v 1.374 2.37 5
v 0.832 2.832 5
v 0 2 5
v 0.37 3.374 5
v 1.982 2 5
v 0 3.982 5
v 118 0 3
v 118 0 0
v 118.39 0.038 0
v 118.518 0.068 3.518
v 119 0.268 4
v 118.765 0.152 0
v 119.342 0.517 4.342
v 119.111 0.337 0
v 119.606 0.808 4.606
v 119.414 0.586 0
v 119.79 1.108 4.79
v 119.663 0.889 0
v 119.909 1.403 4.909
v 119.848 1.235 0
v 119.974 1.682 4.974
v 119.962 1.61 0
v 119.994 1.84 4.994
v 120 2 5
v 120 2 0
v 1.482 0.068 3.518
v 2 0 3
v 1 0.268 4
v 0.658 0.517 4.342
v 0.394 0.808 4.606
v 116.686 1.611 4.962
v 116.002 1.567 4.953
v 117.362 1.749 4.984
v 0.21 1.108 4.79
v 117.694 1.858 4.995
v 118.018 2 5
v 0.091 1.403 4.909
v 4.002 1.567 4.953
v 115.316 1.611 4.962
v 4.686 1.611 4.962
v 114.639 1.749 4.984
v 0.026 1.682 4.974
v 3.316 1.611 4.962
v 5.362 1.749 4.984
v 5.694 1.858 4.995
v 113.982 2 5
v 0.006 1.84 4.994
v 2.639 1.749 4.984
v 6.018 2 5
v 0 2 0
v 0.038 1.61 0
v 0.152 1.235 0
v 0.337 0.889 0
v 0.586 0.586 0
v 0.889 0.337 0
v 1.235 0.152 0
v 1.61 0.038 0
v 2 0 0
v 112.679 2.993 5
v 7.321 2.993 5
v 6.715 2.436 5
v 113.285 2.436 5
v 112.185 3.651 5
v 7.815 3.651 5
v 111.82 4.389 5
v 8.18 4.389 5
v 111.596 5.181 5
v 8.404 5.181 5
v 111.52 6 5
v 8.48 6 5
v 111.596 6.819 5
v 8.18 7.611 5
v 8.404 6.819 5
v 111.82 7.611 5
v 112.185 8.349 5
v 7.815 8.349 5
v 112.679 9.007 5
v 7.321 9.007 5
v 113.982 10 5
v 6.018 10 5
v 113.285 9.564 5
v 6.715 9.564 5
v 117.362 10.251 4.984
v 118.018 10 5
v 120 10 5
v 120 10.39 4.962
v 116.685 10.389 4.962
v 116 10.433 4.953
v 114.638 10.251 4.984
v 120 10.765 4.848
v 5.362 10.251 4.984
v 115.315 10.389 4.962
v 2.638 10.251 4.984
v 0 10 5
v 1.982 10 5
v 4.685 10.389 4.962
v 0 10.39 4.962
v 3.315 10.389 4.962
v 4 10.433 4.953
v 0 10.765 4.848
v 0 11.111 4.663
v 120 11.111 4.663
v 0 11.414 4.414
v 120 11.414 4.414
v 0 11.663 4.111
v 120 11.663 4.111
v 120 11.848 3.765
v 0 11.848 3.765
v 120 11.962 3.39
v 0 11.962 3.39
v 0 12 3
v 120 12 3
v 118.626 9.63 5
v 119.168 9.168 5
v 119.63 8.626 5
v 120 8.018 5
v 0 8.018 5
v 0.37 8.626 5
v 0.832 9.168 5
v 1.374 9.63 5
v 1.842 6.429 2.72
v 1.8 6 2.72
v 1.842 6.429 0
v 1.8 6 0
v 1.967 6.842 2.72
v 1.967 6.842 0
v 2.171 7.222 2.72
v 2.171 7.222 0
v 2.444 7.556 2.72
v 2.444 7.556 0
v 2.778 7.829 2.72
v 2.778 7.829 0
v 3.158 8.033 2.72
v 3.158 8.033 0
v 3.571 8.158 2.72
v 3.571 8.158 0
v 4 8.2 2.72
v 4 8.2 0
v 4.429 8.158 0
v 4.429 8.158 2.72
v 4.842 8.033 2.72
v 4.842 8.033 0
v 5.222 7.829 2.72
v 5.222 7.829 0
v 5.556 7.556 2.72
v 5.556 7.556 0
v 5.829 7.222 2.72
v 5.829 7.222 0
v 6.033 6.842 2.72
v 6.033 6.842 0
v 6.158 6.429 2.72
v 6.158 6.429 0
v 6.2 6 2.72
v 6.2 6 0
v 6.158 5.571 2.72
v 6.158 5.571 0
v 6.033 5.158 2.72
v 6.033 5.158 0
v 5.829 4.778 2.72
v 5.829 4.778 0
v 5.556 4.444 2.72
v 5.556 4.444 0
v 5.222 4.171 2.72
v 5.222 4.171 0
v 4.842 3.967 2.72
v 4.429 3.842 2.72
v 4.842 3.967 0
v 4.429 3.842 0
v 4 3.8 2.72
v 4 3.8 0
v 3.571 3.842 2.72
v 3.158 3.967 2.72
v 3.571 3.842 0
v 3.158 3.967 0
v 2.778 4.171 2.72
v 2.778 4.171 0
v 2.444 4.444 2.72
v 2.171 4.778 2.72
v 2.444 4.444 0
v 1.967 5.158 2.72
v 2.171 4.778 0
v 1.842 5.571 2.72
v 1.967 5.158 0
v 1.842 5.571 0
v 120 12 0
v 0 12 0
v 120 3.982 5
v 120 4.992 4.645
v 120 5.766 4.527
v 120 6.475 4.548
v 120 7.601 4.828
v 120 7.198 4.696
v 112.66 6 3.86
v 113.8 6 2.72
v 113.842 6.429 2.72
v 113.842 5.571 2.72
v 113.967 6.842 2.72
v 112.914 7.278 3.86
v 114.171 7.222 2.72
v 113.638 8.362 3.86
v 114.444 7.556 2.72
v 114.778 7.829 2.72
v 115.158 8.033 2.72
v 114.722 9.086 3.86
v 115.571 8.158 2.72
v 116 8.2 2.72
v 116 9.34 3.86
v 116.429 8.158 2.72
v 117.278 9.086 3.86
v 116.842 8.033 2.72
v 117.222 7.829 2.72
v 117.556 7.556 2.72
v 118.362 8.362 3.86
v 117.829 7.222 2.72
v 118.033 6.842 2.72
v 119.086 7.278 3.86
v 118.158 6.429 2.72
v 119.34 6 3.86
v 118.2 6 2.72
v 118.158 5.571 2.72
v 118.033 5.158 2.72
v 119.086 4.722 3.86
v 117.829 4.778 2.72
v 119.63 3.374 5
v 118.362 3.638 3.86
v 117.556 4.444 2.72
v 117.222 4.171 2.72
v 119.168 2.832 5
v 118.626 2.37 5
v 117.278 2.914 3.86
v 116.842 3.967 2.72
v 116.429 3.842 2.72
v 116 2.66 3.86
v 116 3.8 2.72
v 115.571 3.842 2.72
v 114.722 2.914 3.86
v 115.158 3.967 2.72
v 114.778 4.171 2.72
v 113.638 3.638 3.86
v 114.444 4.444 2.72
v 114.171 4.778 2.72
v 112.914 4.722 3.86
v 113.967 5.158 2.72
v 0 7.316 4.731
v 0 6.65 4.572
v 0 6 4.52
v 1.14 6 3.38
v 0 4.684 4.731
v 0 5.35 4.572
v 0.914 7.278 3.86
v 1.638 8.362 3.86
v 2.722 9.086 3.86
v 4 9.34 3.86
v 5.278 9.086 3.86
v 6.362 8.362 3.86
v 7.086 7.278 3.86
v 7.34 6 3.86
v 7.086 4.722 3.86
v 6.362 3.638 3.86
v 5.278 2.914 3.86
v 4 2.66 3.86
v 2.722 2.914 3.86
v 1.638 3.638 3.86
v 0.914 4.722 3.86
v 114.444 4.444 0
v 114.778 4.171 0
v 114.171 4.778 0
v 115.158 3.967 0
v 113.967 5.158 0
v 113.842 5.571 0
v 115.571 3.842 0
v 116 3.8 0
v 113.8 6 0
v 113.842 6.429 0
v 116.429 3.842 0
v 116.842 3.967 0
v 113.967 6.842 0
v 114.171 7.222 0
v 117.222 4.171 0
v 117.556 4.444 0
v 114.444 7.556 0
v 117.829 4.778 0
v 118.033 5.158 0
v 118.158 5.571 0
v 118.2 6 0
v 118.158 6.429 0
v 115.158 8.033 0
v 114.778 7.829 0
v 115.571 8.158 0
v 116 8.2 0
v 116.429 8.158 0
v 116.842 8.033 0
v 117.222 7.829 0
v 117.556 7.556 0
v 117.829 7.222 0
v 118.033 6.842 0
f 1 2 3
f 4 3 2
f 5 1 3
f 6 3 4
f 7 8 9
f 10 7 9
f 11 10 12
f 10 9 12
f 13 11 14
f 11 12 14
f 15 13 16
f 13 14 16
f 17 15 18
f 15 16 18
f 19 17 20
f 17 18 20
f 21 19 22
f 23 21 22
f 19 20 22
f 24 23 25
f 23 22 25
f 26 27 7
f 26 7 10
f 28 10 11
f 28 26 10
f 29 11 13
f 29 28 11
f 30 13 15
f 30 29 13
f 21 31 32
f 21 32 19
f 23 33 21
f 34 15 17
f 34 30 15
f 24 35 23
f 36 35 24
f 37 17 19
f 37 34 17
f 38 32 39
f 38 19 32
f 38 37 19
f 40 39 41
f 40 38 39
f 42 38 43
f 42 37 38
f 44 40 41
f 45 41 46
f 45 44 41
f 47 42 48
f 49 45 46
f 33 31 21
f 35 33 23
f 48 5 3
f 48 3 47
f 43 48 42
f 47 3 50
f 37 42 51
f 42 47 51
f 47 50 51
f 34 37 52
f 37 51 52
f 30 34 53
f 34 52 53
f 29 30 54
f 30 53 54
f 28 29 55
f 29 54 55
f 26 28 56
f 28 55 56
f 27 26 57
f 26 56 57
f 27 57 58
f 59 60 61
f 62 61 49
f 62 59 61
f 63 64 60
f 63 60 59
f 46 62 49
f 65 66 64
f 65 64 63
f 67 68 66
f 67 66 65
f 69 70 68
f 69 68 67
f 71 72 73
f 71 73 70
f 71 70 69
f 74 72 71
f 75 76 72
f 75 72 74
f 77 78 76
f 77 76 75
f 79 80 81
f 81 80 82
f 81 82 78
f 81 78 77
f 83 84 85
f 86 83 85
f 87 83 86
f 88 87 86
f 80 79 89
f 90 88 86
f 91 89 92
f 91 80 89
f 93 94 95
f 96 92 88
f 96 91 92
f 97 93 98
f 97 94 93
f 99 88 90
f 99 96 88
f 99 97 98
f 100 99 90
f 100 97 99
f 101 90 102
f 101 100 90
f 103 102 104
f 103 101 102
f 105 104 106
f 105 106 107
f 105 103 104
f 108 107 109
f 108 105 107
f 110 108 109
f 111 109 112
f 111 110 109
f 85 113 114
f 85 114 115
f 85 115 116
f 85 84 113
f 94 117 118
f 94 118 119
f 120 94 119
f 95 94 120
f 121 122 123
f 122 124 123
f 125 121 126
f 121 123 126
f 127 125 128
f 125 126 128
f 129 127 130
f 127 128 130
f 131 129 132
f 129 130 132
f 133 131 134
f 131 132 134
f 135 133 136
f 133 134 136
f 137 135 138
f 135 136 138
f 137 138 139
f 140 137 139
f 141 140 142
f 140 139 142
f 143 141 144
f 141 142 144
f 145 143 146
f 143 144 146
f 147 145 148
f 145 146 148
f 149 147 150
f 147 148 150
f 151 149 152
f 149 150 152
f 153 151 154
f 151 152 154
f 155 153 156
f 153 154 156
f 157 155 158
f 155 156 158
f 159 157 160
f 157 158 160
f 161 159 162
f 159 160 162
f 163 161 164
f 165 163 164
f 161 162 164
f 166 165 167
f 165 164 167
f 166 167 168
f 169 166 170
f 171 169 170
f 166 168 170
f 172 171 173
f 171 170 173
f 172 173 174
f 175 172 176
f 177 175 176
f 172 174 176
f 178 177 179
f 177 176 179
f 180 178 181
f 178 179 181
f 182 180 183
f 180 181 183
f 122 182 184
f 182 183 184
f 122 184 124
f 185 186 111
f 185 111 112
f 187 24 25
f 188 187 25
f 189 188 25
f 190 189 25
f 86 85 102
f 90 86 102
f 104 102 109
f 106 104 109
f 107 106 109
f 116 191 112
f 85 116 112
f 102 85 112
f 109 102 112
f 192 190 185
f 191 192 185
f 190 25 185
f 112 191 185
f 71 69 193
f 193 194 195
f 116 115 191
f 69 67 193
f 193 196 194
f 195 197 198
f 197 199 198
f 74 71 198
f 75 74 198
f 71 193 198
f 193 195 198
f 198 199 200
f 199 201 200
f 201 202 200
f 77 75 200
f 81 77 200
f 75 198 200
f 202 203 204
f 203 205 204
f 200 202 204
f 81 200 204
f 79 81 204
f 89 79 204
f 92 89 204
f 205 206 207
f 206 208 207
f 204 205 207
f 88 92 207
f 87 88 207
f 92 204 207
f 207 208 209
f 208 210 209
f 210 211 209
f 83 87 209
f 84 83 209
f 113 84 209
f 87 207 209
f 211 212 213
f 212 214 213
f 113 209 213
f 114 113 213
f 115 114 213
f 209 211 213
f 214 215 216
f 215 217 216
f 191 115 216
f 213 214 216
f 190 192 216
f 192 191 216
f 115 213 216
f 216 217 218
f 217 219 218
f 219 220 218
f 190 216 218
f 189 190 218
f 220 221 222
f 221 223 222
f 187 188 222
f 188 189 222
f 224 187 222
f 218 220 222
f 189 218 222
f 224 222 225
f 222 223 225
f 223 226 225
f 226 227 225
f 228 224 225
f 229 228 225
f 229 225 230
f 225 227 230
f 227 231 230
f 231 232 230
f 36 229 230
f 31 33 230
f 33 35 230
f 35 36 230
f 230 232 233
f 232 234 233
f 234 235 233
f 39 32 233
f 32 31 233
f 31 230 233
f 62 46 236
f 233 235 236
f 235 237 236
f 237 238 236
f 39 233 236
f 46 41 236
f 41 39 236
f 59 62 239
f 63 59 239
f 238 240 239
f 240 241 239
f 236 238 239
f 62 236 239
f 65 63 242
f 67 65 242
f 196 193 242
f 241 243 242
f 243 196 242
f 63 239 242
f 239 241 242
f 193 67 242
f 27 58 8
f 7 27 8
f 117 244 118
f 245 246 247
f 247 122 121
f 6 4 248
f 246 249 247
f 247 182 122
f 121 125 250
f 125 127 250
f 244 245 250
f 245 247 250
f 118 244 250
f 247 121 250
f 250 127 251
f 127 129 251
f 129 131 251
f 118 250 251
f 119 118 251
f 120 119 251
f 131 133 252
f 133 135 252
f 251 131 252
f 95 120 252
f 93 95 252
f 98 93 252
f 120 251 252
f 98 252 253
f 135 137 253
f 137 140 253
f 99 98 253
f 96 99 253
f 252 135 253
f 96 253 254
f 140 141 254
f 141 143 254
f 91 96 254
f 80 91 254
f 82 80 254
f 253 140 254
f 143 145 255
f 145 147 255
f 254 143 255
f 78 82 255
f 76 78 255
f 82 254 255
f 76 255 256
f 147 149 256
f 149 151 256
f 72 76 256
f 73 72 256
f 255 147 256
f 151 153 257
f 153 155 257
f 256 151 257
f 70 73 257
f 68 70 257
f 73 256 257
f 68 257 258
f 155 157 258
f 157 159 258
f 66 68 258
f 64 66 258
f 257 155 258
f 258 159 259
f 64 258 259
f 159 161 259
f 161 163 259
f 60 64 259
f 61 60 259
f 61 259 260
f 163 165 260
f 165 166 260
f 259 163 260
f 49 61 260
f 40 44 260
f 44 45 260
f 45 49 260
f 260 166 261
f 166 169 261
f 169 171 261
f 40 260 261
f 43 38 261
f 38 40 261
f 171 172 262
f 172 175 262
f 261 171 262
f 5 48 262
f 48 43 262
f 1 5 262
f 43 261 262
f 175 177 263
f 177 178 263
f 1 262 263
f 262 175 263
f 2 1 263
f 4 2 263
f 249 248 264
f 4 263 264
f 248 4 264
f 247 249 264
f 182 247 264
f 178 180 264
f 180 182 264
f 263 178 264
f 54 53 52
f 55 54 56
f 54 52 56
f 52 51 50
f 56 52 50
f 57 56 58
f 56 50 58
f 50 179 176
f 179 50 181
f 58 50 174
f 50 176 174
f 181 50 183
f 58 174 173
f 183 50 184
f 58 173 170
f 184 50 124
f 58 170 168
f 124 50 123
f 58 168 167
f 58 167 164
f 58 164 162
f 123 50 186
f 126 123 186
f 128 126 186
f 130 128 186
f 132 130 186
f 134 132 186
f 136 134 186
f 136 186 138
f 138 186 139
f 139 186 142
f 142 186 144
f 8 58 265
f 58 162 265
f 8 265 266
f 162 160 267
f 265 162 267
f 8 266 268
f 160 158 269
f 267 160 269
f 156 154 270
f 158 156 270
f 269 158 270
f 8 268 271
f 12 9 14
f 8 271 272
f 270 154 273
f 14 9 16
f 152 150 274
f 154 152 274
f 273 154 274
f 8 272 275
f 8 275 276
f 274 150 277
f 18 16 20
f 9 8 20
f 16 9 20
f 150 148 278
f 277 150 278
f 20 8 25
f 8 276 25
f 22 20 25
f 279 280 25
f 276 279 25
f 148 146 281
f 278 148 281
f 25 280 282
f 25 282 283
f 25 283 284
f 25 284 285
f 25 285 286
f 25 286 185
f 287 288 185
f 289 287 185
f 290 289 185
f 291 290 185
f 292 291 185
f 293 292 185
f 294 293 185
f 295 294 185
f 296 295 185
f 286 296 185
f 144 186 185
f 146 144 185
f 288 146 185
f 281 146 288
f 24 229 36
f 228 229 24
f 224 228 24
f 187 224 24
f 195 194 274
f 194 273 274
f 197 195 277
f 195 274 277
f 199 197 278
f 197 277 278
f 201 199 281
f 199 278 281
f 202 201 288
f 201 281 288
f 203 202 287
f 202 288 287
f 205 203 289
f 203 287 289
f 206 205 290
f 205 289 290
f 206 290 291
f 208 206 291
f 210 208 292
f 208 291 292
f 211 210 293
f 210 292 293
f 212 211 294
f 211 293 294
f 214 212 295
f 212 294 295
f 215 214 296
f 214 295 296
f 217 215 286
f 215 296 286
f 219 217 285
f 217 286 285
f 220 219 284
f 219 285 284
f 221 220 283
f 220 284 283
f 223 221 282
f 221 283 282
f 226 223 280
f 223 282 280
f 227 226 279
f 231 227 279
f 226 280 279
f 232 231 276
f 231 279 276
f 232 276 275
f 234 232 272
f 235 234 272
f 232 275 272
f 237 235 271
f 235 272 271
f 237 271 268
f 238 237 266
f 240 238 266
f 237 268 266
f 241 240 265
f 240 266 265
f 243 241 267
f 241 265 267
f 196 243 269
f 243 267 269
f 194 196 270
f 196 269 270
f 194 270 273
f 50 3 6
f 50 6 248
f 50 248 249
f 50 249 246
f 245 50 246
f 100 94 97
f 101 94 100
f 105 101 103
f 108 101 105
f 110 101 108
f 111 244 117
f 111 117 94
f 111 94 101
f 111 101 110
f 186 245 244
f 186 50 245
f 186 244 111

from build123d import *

# Parameters (mm, degrees)
F0_W           = 120
F0_H           = 12
F1_DEPTH       = 5
F3_D           = 4.4
F3_DEPTH       = 18
F3_CSINK_D     = 8.96
F3_CSINK_ANGLE = 90
F3_TIP         = 1.3218933619
F4_T1_DEPTH    = 130
F4_T3_DEPTH    = 15


# Not quite as in the source:
# - a fillet or chamfer that OpenCascade refuses, or shapes differently, is made with other operations: its cross-section is extruded or revolved along the edge and cut away or added


with BuildPart() as f1:
    # F0 (on Top) → F1 (new body)
    with BuildSketch(Plane.XY):
        with Locations((60, 6)):
            Rectangle(F0_W, F0_H)
    extrude(amount=F1_DEPTH)

    # F3
    with Locations(Plane.XY.offset(5)):
        with Locations((4, 6), (116, 6)):
            CounterSinkHole(F3_D / 2, F3_CSINK_D / 2, depth=F3_DEPTH, counter_sink_angle=F3_CSINK_ANGLE)
            with Locations((0, 0, -(F3_DEPTH + F3_TIP / 2))):  # 118° drill point
                Cone(0, F3_D / 2, F3_TIP, mode=Mode.SUBTRACT)

    # F4: fillet of radius 2 on 4 edges, made by hand

    # F4_s2 → F4_t1 (cut)
    with BuildSketch(Plane.YZ.offset(-5)):
        with BuildLine():
            ThreePointArc((0, 3), (0.5857864376, 4.4142135624), (2, 5))
            Line((2, 5), (0, 5))
            Line((0, 5), (0, 3))
        make_face()
        with BuildLine():
            ThreePointArc((10, 5), (11.4142135624, 4.4142135624), (12, 3))
            Line((12, 3), (12, 5))
            Line((12, 5), (10, 5))
        make_face()
    extrude(amount=F4_T1_DEPTH, mode=Mode.SUBTRACT)

    # F4_s4 → F4_t3 (cut)
    with BuildSketch(Plane.XY.offset(-5)):
        with BuildLine():
            ThreePointArc((0, 2), (0.5857864376, 0.5857864376), (2, 0))
            Line((2, 0), (0, 0))
            Line((0, 0), (0, 2))
        make_face()
        with BuildLine():
            ThreePointArc((118, 0), (119.4142135624, 0.5857864376), (120, 2))
            Line((120, 2), (120, 0))
            Line((120, 0), (118, 0))
        make_face()
    extrude(amount=F4_T3_DEPTH, mode=Mode.SUBTRACT)


solid = f1.part
